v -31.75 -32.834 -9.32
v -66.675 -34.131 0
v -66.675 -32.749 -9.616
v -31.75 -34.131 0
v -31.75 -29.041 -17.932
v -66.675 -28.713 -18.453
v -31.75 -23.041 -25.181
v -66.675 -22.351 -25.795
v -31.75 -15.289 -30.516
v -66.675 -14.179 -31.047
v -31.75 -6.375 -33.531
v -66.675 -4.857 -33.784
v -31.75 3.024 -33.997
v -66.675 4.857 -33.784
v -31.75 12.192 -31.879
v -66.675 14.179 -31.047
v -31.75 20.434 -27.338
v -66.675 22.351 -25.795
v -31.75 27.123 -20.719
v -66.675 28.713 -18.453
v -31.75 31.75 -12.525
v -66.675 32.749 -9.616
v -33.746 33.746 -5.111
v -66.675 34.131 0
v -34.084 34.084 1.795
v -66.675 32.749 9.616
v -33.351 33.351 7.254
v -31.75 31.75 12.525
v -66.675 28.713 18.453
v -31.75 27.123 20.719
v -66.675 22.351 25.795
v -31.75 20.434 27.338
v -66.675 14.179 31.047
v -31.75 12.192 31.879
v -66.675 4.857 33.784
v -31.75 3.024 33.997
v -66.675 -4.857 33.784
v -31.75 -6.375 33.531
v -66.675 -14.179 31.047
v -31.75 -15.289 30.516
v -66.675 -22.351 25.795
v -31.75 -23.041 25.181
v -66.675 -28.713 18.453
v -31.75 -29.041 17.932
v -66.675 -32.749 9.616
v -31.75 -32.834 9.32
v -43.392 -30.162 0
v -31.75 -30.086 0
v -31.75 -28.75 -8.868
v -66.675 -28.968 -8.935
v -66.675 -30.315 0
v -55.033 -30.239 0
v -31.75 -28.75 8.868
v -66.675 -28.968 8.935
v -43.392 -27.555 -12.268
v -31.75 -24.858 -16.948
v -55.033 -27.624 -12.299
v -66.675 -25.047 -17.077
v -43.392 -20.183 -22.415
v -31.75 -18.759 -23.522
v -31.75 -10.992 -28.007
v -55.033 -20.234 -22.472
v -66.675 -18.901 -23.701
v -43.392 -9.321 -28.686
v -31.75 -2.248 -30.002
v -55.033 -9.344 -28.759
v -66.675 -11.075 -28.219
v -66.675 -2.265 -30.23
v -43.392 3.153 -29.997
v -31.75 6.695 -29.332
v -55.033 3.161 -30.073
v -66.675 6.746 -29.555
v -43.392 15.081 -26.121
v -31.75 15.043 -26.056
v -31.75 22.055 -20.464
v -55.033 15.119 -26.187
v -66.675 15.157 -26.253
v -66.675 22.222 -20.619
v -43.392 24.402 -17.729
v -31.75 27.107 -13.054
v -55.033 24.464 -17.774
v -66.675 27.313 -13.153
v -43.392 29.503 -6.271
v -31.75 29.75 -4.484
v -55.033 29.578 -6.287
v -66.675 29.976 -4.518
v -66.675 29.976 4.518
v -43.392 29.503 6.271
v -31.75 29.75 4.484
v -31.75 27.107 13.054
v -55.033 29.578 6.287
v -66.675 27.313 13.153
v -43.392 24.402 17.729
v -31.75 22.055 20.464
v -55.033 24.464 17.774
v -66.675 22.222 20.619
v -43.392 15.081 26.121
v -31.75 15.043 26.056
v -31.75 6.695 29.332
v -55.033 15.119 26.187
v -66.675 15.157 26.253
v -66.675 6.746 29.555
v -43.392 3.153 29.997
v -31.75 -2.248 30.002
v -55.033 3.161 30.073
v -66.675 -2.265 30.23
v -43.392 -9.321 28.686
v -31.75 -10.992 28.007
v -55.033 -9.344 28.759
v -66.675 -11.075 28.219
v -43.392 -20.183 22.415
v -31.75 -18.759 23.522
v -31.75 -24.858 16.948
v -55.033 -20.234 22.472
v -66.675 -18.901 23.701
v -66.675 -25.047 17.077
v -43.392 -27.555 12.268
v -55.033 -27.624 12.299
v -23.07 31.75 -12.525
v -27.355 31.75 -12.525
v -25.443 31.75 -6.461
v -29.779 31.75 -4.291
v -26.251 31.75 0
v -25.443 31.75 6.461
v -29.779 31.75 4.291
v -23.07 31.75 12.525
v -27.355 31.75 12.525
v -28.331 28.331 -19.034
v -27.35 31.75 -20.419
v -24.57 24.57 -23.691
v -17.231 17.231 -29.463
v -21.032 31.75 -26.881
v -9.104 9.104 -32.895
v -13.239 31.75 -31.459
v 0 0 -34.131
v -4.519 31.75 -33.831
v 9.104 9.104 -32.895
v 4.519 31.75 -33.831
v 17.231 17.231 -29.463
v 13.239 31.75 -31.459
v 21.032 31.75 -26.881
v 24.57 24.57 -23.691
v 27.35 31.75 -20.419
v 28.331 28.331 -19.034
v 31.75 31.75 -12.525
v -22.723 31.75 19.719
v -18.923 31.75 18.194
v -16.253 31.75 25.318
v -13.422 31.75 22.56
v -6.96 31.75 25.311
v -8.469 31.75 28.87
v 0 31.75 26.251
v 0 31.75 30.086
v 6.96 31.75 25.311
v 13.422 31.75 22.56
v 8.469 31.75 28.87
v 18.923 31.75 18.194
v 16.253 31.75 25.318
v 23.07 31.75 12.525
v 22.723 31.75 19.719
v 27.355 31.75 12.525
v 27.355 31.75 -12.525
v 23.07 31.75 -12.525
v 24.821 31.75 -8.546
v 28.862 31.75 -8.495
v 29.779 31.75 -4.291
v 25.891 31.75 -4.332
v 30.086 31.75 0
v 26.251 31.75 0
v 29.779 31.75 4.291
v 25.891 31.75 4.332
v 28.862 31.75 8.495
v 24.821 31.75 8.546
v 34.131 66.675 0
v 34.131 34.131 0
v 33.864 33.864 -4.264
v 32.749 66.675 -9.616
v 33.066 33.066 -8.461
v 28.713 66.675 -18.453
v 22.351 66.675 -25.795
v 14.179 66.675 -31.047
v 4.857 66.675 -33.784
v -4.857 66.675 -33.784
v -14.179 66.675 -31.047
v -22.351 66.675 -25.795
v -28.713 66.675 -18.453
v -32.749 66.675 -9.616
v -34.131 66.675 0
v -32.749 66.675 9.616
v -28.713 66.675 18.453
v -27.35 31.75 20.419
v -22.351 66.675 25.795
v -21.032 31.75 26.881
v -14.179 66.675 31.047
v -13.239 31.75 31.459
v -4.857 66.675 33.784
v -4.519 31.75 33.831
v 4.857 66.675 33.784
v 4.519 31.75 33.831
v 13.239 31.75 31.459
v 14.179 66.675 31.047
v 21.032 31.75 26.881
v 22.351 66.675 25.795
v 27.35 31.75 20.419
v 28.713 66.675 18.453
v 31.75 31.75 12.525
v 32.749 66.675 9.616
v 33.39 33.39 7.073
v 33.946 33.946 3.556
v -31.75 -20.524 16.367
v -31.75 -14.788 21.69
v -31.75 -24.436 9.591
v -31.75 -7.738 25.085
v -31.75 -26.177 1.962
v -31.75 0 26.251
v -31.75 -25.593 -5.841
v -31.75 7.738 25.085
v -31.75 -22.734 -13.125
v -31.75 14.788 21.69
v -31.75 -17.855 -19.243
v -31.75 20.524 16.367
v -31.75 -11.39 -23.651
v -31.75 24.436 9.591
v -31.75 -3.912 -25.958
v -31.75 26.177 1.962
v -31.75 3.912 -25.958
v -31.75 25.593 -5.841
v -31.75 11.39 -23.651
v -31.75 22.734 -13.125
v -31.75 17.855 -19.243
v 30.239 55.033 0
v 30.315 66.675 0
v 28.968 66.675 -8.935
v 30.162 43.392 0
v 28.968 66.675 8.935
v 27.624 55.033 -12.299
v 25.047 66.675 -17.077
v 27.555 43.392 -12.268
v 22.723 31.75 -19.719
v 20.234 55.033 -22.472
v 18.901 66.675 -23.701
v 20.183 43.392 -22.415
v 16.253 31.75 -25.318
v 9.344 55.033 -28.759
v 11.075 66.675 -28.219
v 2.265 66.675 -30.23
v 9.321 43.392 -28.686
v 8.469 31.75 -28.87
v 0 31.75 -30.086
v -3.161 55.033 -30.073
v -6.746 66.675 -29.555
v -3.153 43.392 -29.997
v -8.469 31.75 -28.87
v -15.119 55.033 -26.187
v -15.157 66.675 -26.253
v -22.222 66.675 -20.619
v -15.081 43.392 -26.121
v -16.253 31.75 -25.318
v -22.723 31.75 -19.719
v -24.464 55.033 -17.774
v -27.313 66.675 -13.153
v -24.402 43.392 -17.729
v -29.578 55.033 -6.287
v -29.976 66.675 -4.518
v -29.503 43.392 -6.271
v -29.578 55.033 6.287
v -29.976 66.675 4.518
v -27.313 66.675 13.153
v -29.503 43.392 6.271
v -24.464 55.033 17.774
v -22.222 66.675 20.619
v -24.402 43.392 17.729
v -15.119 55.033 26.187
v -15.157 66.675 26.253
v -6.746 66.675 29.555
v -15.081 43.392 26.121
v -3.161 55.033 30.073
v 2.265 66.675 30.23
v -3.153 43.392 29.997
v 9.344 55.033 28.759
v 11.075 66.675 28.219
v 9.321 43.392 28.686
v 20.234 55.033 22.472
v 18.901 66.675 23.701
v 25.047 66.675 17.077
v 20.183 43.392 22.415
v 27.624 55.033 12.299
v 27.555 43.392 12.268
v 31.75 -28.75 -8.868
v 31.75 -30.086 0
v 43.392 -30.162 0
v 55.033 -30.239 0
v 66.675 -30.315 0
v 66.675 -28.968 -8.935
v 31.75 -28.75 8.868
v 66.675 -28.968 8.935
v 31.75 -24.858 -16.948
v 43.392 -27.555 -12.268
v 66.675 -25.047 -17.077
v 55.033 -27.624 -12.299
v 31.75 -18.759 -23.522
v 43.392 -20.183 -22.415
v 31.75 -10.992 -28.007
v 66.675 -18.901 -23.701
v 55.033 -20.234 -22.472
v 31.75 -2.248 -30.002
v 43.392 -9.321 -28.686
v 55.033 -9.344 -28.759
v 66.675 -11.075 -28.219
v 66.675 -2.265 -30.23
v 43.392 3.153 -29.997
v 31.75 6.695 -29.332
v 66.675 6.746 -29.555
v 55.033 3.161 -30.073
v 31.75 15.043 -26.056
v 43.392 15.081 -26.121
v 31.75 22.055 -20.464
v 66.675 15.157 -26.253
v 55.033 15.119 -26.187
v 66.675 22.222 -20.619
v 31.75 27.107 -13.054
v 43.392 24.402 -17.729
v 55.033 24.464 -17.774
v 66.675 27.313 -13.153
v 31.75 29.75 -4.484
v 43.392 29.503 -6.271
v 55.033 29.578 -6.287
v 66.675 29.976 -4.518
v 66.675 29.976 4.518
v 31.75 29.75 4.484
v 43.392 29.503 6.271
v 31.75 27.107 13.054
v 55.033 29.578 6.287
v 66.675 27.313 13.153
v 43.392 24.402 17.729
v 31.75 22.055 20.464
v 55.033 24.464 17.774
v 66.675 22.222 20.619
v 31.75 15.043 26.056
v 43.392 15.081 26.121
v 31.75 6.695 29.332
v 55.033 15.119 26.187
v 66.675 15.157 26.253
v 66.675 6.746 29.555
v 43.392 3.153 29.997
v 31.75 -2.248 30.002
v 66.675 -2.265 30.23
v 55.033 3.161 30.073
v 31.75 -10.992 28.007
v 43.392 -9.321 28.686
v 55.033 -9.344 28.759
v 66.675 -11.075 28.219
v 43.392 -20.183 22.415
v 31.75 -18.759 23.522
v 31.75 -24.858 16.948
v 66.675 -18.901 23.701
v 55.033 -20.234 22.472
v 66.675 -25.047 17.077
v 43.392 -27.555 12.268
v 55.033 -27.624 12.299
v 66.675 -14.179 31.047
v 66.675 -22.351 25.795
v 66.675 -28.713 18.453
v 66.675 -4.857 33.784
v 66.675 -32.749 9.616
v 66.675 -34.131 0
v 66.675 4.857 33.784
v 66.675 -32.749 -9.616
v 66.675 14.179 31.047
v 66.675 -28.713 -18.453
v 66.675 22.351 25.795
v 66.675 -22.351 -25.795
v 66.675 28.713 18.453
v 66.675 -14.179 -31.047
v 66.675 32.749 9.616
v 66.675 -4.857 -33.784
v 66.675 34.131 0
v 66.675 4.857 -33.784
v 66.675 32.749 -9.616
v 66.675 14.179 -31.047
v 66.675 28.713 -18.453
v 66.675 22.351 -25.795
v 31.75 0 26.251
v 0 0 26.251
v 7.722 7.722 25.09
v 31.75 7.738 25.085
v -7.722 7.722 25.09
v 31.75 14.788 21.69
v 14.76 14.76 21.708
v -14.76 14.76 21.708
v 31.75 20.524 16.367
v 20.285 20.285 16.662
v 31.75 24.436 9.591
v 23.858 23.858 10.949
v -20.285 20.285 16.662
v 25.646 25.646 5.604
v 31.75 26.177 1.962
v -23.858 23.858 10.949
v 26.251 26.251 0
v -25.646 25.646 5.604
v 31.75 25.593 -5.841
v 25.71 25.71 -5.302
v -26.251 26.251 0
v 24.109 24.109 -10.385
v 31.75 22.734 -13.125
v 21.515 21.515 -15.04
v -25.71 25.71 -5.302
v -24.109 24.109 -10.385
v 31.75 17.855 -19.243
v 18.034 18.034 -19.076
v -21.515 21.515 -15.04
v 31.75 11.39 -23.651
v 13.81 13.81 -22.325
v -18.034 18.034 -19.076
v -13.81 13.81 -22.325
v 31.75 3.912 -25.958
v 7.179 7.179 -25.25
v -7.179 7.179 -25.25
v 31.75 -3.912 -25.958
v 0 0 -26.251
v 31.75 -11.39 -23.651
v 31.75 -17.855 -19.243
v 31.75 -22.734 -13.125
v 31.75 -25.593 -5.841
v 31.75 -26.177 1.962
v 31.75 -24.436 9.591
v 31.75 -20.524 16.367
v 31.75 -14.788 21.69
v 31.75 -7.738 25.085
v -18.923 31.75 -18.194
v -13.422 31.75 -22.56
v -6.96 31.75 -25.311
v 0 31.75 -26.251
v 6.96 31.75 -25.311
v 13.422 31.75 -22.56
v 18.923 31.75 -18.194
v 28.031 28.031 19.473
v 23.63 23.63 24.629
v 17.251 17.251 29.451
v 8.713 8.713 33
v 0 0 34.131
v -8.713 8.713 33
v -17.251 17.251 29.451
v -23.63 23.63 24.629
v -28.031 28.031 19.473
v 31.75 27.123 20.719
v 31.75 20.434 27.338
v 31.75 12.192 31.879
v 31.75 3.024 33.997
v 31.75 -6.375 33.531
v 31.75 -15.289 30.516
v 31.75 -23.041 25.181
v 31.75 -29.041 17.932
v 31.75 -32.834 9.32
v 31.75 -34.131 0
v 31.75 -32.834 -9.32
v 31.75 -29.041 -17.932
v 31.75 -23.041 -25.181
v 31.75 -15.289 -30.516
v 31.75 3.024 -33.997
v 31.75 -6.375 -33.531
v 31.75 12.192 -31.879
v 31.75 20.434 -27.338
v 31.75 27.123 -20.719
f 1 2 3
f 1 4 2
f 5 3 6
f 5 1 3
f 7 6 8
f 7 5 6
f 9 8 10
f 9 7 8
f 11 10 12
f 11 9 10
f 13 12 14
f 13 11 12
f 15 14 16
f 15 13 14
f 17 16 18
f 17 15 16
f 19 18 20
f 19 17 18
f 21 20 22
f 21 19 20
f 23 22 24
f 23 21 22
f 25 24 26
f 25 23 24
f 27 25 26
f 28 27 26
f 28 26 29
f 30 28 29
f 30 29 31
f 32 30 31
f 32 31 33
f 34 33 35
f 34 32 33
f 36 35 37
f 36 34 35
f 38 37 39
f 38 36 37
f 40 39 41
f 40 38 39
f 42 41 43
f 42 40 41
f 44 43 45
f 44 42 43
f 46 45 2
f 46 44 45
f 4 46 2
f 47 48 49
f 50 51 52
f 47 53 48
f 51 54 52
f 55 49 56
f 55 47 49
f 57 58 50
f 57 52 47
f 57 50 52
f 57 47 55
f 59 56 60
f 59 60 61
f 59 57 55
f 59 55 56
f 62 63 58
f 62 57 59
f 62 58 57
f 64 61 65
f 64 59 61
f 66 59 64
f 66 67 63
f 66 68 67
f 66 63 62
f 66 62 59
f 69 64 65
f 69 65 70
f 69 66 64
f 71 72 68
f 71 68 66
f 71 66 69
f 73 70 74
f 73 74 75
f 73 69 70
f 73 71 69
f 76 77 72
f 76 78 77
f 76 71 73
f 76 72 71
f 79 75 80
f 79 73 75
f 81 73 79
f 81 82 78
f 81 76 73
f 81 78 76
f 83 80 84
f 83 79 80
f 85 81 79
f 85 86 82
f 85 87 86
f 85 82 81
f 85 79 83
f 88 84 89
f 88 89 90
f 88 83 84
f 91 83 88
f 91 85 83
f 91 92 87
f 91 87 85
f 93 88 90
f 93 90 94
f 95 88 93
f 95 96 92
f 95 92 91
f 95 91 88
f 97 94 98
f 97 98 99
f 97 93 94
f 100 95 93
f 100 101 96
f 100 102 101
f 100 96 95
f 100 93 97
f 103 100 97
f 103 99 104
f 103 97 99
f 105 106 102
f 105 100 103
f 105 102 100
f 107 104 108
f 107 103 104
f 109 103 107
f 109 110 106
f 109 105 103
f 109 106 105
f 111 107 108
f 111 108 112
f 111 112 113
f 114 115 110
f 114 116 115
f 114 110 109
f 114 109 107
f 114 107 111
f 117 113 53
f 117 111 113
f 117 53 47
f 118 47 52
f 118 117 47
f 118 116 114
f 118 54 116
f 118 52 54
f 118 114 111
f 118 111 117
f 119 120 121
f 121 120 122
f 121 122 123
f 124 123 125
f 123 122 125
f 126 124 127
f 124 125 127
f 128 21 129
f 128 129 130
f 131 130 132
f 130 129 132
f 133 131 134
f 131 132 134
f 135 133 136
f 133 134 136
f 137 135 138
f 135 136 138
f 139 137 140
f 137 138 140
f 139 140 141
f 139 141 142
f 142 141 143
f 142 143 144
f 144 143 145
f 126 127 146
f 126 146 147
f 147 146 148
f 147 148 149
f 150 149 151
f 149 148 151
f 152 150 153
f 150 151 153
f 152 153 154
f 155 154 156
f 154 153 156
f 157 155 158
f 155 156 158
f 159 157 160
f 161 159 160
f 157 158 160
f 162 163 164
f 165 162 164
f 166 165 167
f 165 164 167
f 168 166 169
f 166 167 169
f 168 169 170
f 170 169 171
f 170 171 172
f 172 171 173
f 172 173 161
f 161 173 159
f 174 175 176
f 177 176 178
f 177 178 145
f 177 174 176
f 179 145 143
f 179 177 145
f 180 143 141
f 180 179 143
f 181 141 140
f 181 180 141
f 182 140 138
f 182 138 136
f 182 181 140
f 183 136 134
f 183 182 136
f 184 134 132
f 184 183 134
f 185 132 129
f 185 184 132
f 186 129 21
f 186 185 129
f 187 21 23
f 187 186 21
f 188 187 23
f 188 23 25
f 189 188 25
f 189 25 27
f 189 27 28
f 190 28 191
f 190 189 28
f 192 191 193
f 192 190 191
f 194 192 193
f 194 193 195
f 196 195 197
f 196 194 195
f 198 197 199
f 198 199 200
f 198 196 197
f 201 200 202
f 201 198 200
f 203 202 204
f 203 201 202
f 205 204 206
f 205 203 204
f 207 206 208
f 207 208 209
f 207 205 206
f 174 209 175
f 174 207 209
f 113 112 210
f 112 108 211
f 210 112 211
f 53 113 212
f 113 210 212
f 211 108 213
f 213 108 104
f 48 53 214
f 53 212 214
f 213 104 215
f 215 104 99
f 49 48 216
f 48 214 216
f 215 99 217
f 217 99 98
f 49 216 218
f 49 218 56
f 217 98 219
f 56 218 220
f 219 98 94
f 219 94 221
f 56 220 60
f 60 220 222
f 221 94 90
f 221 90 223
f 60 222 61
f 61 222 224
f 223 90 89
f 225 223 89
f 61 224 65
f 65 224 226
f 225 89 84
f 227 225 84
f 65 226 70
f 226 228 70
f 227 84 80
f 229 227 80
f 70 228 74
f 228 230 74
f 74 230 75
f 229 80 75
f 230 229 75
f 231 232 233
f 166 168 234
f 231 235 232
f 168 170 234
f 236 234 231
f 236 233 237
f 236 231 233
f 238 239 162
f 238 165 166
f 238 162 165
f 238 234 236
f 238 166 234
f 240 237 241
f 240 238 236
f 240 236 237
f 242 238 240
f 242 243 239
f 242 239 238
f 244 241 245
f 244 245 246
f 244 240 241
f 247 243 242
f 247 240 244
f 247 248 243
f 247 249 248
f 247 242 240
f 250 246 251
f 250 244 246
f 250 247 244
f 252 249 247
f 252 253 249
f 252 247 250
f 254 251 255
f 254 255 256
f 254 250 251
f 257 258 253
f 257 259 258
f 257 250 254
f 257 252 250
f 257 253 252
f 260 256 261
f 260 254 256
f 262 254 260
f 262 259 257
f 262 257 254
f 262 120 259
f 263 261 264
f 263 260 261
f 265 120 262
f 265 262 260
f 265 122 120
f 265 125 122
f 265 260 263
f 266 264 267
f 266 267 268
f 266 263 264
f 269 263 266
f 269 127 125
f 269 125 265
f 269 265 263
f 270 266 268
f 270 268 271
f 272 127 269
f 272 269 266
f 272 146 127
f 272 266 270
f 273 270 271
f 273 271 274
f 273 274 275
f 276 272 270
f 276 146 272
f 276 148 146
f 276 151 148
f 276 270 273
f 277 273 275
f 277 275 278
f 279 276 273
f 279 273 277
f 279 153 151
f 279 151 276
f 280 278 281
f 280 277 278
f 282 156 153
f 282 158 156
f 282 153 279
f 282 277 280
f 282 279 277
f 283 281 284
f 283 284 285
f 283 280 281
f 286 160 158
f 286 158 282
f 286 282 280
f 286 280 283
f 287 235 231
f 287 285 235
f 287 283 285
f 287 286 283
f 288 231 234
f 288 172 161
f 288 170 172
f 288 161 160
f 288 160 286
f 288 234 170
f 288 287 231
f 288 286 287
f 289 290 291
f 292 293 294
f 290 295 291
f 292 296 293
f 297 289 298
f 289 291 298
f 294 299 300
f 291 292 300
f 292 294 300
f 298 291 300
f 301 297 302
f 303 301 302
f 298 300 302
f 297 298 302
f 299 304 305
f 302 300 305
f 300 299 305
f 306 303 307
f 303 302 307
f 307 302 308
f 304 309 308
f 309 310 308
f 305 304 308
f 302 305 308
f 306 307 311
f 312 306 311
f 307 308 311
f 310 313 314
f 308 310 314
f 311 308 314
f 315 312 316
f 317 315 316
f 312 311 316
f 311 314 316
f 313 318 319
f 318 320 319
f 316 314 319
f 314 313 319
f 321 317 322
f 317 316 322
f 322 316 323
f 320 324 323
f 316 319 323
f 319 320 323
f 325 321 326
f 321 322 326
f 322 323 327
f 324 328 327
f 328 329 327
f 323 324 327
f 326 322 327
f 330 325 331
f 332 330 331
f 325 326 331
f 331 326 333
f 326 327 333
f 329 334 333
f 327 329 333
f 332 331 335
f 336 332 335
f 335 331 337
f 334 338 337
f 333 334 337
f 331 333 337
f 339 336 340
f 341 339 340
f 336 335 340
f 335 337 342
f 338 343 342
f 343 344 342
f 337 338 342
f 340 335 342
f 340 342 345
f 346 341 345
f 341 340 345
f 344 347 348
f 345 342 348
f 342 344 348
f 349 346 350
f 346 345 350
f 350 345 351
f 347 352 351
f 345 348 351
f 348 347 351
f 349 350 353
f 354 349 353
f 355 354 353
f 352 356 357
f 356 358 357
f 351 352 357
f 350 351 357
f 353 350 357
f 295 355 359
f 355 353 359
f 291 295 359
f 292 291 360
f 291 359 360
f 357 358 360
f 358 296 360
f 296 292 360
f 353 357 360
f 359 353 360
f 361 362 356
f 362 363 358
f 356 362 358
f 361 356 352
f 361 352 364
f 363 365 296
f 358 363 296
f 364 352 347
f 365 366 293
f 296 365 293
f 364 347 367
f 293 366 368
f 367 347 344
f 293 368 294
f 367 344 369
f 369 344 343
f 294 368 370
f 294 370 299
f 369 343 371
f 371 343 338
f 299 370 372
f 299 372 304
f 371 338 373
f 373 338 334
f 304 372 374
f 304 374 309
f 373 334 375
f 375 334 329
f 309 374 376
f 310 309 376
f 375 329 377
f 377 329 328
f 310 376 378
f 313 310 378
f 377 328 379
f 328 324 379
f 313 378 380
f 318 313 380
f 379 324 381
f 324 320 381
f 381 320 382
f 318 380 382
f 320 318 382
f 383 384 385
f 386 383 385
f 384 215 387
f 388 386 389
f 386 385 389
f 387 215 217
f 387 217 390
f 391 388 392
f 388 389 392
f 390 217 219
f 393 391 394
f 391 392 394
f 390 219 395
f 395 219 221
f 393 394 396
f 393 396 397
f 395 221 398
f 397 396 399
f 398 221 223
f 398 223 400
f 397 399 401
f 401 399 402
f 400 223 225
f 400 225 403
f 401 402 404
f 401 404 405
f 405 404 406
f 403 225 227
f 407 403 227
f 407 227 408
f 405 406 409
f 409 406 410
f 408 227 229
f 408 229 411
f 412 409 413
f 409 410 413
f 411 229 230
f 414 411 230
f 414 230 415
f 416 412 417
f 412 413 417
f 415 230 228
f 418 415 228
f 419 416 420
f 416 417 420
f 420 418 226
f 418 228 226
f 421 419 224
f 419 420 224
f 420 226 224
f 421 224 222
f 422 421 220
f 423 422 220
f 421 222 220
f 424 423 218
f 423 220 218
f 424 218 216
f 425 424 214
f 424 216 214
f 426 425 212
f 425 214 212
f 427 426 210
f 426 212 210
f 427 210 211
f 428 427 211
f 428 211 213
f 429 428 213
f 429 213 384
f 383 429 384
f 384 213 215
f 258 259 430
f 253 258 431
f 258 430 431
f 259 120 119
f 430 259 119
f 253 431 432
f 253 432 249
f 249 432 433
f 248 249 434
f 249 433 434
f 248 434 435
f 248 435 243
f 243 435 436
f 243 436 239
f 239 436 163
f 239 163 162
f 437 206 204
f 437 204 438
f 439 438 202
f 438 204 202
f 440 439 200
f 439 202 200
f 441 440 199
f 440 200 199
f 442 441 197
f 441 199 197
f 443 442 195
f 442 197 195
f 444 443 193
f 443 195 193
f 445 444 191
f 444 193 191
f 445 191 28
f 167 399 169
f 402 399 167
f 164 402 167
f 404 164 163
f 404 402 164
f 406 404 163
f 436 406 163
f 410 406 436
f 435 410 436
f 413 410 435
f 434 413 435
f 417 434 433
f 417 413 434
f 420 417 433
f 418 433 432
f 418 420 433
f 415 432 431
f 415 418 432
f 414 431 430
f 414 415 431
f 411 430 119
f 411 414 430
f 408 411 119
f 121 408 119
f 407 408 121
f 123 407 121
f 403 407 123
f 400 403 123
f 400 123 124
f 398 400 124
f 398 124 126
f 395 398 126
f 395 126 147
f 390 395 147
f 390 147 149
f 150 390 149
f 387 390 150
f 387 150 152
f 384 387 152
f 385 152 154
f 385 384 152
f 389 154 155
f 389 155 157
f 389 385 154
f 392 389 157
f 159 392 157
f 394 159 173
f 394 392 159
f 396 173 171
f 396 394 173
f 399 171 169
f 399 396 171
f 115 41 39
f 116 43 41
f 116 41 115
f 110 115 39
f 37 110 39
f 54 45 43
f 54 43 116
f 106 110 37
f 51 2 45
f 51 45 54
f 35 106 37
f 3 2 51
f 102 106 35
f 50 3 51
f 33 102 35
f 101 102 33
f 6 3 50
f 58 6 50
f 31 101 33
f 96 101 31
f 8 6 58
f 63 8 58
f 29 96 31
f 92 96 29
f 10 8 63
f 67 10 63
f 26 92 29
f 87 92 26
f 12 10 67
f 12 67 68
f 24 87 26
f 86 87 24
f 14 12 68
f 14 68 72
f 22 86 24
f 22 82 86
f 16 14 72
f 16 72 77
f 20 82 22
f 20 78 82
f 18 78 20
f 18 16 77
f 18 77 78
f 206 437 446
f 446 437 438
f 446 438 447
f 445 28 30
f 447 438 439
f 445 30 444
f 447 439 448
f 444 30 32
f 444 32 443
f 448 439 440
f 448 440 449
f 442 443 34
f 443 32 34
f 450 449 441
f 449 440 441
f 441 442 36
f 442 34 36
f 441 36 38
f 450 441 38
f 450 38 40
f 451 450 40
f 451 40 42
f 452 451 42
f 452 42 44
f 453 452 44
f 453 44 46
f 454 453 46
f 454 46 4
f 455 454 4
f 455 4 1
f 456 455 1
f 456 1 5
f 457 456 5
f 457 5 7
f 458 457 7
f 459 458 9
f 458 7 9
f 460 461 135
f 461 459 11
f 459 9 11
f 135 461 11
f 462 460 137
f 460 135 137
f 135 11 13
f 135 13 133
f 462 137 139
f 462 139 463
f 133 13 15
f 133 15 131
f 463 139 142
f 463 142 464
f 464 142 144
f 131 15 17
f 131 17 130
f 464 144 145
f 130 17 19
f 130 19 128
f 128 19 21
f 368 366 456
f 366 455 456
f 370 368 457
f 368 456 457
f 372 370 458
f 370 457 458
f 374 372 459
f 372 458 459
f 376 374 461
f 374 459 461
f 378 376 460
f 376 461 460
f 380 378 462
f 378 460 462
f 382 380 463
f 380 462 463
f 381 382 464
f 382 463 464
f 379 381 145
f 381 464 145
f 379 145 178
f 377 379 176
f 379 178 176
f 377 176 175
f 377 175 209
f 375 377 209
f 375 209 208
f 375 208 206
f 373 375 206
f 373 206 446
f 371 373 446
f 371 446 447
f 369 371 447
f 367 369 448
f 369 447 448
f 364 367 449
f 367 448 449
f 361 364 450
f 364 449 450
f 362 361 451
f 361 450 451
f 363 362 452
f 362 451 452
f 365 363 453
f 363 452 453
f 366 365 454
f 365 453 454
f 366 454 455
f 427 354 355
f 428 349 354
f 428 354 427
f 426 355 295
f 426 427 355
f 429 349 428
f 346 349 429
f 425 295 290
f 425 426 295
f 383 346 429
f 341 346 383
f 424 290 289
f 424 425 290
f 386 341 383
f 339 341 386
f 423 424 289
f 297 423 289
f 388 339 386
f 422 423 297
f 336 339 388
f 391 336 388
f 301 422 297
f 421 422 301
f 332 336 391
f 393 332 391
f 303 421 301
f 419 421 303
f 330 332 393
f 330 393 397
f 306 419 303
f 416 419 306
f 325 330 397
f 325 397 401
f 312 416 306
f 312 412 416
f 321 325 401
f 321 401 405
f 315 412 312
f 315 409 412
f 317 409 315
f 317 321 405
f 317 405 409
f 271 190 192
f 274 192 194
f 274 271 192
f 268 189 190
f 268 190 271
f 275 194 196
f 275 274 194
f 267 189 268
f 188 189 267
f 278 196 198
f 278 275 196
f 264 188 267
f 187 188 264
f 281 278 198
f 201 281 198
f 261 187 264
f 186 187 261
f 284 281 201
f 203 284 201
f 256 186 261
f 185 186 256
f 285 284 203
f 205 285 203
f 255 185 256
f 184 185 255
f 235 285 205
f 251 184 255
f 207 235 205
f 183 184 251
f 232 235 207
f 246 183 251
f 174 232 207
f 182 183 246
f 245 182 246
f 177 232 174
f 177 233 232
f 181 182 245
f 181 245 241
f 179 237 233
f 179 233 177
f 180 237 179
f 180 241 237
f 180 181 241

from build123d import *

# Parameters (mm, degrees)
BOSS_EXTRUDE1_DEPTH = 63.5
BOSS_EXTRUDE2_REACH = 67.881
SKETCH5_R           = 26.2509
CUT_EXTRUDE1_DEPTH  = 63.5
CUT_EXTRUDE2_START  = -31.75
SKETCH6_R           = 26.2509
CUT_EXTRUDE2_DEPTH  = 31.75


with BuildPart() as part:
    # Sketch1 → Revolve1 (revolve)
    with BuildSketch(Plane.XY):
        Polygon((-66.675, -34.13125), (-31.75, -34.13125), (-31.75, -30.0863), (-66.675, -30.3149), align=None)
    revolve(axis=Axis((-66.675, 0, 0), (1, 0, 0)))


with BuildPart() as body_2:
    # Mirror1: mirrored copy
    add(part.part.mirror(Plane(origin=(0, 0, 0), x_dir=(0, 0, 1), z_dir=(1, 0, 0))))


with BuildPart() as body_3:
    # Sketch2 → Revolve2 (revolve)
    with BuildSketch(Plane.XY):
        Polygon((30.3149, 66.675), (30.0863, 31.75), (34.13125, 31.75), (34.13125, 66.675), align=None)
    revolve(axis=Axis((0, 0, 0), (0, 1, 0)))


with BuildPart() as part_1:
    add(part.part)

    add(body_2.part)  # Boss-Extrude1 merges body 2

    add(body_3.part)  # Boss-Extrude1 merges body 3
    # Sketch3 → Boss-Extrude1 (add)
    with BuildSketch(Plane(origin=(-31.75, 0, 0), x_dir=(0, 0, -1), z_dir=(1, 0, 0))):
        with BuildLine():
            Line((12.525163734, 31.75), (-12.525163734, 31.75))
            ThreePointArc((-12.525163734, 31.75), (0, -34.13125), (12.525163734, 31.75))
        make_face()
    extrude(amount=BOSS_EXTRUDE1_DEPTH)

    # Sketch4 → Boss-Extrude2 (add, up to next)
    with BuildSketch(Plane.XZ.offset(-31.75), mode=Mode.PRIVATE) as boss_extrude2_sk1:
        with BuildLine():
            ThreePointArc((-31.75, -12.525163734), (0, -34.13125), (31.75, -12.525163734))
            Line((31.75, -12.525163734), (-31.75, -12.525163734))
        make_face()
    boss_extrude2_tool1 = extrude(boss_extrude2_sk1.sketch, amount=BOSS_EXTRUDE2_REACH, mode=Mode.PRIVATE) - part_1.part
    add(boss_extrude2_tool1.solids().sort_by_distance((0, 31.75, -21.455636))[0])
    # Sketch4 → Boss-Extrude2 (add, up to next)
    with BuildSketch(Plane.XZ.offset(-31.75), mode=Mode.PRIVATE) as boss_extrude2_sk2:
        with BuildLine():
            ThreePointArc((31.75, 12.525163734), (0, 34.13125), (-31.75, 12.525163734))
            Line((-31.75, 12.525163734), (31.75, 12.525163734))
        make_face()
    boss_extrude2_tool2 = extrude(boss_extrude2_sk2.sketch, amount=BOSS_EXTRUDE2_REACH, mode=Mode.PRIVATE) - part_1.part
    add(boss_extrude2_tool2.solids().sort_by_distance((0, 31.75, 21.455636))[0])

    # Sketch5 → Cut-Extrude1 (cut)
    with BuildSketch(Plane.ZY.offset(31.75)):
        Circle(SKETCH5_R)
    extrude(amount=-CUT_EXTRUDE1_DEPTH, mode=Mode.SUBTRACT)

    # Sketch6 → Cut-Extrude2 (cut)
    with BuildSketch(Plane(origin=(0, 31.75, 0), x_dir=(1, 0, 0), z_dir=(0, 1, 0)).offset(CUT_EXTRUDE2_START)):
        Circle(SKETCH6_R)
    extrude(amount=CUT_EXTRUDE2_DEPTH, mode=Mode.SUBTRACT)


solid = part_1.part
